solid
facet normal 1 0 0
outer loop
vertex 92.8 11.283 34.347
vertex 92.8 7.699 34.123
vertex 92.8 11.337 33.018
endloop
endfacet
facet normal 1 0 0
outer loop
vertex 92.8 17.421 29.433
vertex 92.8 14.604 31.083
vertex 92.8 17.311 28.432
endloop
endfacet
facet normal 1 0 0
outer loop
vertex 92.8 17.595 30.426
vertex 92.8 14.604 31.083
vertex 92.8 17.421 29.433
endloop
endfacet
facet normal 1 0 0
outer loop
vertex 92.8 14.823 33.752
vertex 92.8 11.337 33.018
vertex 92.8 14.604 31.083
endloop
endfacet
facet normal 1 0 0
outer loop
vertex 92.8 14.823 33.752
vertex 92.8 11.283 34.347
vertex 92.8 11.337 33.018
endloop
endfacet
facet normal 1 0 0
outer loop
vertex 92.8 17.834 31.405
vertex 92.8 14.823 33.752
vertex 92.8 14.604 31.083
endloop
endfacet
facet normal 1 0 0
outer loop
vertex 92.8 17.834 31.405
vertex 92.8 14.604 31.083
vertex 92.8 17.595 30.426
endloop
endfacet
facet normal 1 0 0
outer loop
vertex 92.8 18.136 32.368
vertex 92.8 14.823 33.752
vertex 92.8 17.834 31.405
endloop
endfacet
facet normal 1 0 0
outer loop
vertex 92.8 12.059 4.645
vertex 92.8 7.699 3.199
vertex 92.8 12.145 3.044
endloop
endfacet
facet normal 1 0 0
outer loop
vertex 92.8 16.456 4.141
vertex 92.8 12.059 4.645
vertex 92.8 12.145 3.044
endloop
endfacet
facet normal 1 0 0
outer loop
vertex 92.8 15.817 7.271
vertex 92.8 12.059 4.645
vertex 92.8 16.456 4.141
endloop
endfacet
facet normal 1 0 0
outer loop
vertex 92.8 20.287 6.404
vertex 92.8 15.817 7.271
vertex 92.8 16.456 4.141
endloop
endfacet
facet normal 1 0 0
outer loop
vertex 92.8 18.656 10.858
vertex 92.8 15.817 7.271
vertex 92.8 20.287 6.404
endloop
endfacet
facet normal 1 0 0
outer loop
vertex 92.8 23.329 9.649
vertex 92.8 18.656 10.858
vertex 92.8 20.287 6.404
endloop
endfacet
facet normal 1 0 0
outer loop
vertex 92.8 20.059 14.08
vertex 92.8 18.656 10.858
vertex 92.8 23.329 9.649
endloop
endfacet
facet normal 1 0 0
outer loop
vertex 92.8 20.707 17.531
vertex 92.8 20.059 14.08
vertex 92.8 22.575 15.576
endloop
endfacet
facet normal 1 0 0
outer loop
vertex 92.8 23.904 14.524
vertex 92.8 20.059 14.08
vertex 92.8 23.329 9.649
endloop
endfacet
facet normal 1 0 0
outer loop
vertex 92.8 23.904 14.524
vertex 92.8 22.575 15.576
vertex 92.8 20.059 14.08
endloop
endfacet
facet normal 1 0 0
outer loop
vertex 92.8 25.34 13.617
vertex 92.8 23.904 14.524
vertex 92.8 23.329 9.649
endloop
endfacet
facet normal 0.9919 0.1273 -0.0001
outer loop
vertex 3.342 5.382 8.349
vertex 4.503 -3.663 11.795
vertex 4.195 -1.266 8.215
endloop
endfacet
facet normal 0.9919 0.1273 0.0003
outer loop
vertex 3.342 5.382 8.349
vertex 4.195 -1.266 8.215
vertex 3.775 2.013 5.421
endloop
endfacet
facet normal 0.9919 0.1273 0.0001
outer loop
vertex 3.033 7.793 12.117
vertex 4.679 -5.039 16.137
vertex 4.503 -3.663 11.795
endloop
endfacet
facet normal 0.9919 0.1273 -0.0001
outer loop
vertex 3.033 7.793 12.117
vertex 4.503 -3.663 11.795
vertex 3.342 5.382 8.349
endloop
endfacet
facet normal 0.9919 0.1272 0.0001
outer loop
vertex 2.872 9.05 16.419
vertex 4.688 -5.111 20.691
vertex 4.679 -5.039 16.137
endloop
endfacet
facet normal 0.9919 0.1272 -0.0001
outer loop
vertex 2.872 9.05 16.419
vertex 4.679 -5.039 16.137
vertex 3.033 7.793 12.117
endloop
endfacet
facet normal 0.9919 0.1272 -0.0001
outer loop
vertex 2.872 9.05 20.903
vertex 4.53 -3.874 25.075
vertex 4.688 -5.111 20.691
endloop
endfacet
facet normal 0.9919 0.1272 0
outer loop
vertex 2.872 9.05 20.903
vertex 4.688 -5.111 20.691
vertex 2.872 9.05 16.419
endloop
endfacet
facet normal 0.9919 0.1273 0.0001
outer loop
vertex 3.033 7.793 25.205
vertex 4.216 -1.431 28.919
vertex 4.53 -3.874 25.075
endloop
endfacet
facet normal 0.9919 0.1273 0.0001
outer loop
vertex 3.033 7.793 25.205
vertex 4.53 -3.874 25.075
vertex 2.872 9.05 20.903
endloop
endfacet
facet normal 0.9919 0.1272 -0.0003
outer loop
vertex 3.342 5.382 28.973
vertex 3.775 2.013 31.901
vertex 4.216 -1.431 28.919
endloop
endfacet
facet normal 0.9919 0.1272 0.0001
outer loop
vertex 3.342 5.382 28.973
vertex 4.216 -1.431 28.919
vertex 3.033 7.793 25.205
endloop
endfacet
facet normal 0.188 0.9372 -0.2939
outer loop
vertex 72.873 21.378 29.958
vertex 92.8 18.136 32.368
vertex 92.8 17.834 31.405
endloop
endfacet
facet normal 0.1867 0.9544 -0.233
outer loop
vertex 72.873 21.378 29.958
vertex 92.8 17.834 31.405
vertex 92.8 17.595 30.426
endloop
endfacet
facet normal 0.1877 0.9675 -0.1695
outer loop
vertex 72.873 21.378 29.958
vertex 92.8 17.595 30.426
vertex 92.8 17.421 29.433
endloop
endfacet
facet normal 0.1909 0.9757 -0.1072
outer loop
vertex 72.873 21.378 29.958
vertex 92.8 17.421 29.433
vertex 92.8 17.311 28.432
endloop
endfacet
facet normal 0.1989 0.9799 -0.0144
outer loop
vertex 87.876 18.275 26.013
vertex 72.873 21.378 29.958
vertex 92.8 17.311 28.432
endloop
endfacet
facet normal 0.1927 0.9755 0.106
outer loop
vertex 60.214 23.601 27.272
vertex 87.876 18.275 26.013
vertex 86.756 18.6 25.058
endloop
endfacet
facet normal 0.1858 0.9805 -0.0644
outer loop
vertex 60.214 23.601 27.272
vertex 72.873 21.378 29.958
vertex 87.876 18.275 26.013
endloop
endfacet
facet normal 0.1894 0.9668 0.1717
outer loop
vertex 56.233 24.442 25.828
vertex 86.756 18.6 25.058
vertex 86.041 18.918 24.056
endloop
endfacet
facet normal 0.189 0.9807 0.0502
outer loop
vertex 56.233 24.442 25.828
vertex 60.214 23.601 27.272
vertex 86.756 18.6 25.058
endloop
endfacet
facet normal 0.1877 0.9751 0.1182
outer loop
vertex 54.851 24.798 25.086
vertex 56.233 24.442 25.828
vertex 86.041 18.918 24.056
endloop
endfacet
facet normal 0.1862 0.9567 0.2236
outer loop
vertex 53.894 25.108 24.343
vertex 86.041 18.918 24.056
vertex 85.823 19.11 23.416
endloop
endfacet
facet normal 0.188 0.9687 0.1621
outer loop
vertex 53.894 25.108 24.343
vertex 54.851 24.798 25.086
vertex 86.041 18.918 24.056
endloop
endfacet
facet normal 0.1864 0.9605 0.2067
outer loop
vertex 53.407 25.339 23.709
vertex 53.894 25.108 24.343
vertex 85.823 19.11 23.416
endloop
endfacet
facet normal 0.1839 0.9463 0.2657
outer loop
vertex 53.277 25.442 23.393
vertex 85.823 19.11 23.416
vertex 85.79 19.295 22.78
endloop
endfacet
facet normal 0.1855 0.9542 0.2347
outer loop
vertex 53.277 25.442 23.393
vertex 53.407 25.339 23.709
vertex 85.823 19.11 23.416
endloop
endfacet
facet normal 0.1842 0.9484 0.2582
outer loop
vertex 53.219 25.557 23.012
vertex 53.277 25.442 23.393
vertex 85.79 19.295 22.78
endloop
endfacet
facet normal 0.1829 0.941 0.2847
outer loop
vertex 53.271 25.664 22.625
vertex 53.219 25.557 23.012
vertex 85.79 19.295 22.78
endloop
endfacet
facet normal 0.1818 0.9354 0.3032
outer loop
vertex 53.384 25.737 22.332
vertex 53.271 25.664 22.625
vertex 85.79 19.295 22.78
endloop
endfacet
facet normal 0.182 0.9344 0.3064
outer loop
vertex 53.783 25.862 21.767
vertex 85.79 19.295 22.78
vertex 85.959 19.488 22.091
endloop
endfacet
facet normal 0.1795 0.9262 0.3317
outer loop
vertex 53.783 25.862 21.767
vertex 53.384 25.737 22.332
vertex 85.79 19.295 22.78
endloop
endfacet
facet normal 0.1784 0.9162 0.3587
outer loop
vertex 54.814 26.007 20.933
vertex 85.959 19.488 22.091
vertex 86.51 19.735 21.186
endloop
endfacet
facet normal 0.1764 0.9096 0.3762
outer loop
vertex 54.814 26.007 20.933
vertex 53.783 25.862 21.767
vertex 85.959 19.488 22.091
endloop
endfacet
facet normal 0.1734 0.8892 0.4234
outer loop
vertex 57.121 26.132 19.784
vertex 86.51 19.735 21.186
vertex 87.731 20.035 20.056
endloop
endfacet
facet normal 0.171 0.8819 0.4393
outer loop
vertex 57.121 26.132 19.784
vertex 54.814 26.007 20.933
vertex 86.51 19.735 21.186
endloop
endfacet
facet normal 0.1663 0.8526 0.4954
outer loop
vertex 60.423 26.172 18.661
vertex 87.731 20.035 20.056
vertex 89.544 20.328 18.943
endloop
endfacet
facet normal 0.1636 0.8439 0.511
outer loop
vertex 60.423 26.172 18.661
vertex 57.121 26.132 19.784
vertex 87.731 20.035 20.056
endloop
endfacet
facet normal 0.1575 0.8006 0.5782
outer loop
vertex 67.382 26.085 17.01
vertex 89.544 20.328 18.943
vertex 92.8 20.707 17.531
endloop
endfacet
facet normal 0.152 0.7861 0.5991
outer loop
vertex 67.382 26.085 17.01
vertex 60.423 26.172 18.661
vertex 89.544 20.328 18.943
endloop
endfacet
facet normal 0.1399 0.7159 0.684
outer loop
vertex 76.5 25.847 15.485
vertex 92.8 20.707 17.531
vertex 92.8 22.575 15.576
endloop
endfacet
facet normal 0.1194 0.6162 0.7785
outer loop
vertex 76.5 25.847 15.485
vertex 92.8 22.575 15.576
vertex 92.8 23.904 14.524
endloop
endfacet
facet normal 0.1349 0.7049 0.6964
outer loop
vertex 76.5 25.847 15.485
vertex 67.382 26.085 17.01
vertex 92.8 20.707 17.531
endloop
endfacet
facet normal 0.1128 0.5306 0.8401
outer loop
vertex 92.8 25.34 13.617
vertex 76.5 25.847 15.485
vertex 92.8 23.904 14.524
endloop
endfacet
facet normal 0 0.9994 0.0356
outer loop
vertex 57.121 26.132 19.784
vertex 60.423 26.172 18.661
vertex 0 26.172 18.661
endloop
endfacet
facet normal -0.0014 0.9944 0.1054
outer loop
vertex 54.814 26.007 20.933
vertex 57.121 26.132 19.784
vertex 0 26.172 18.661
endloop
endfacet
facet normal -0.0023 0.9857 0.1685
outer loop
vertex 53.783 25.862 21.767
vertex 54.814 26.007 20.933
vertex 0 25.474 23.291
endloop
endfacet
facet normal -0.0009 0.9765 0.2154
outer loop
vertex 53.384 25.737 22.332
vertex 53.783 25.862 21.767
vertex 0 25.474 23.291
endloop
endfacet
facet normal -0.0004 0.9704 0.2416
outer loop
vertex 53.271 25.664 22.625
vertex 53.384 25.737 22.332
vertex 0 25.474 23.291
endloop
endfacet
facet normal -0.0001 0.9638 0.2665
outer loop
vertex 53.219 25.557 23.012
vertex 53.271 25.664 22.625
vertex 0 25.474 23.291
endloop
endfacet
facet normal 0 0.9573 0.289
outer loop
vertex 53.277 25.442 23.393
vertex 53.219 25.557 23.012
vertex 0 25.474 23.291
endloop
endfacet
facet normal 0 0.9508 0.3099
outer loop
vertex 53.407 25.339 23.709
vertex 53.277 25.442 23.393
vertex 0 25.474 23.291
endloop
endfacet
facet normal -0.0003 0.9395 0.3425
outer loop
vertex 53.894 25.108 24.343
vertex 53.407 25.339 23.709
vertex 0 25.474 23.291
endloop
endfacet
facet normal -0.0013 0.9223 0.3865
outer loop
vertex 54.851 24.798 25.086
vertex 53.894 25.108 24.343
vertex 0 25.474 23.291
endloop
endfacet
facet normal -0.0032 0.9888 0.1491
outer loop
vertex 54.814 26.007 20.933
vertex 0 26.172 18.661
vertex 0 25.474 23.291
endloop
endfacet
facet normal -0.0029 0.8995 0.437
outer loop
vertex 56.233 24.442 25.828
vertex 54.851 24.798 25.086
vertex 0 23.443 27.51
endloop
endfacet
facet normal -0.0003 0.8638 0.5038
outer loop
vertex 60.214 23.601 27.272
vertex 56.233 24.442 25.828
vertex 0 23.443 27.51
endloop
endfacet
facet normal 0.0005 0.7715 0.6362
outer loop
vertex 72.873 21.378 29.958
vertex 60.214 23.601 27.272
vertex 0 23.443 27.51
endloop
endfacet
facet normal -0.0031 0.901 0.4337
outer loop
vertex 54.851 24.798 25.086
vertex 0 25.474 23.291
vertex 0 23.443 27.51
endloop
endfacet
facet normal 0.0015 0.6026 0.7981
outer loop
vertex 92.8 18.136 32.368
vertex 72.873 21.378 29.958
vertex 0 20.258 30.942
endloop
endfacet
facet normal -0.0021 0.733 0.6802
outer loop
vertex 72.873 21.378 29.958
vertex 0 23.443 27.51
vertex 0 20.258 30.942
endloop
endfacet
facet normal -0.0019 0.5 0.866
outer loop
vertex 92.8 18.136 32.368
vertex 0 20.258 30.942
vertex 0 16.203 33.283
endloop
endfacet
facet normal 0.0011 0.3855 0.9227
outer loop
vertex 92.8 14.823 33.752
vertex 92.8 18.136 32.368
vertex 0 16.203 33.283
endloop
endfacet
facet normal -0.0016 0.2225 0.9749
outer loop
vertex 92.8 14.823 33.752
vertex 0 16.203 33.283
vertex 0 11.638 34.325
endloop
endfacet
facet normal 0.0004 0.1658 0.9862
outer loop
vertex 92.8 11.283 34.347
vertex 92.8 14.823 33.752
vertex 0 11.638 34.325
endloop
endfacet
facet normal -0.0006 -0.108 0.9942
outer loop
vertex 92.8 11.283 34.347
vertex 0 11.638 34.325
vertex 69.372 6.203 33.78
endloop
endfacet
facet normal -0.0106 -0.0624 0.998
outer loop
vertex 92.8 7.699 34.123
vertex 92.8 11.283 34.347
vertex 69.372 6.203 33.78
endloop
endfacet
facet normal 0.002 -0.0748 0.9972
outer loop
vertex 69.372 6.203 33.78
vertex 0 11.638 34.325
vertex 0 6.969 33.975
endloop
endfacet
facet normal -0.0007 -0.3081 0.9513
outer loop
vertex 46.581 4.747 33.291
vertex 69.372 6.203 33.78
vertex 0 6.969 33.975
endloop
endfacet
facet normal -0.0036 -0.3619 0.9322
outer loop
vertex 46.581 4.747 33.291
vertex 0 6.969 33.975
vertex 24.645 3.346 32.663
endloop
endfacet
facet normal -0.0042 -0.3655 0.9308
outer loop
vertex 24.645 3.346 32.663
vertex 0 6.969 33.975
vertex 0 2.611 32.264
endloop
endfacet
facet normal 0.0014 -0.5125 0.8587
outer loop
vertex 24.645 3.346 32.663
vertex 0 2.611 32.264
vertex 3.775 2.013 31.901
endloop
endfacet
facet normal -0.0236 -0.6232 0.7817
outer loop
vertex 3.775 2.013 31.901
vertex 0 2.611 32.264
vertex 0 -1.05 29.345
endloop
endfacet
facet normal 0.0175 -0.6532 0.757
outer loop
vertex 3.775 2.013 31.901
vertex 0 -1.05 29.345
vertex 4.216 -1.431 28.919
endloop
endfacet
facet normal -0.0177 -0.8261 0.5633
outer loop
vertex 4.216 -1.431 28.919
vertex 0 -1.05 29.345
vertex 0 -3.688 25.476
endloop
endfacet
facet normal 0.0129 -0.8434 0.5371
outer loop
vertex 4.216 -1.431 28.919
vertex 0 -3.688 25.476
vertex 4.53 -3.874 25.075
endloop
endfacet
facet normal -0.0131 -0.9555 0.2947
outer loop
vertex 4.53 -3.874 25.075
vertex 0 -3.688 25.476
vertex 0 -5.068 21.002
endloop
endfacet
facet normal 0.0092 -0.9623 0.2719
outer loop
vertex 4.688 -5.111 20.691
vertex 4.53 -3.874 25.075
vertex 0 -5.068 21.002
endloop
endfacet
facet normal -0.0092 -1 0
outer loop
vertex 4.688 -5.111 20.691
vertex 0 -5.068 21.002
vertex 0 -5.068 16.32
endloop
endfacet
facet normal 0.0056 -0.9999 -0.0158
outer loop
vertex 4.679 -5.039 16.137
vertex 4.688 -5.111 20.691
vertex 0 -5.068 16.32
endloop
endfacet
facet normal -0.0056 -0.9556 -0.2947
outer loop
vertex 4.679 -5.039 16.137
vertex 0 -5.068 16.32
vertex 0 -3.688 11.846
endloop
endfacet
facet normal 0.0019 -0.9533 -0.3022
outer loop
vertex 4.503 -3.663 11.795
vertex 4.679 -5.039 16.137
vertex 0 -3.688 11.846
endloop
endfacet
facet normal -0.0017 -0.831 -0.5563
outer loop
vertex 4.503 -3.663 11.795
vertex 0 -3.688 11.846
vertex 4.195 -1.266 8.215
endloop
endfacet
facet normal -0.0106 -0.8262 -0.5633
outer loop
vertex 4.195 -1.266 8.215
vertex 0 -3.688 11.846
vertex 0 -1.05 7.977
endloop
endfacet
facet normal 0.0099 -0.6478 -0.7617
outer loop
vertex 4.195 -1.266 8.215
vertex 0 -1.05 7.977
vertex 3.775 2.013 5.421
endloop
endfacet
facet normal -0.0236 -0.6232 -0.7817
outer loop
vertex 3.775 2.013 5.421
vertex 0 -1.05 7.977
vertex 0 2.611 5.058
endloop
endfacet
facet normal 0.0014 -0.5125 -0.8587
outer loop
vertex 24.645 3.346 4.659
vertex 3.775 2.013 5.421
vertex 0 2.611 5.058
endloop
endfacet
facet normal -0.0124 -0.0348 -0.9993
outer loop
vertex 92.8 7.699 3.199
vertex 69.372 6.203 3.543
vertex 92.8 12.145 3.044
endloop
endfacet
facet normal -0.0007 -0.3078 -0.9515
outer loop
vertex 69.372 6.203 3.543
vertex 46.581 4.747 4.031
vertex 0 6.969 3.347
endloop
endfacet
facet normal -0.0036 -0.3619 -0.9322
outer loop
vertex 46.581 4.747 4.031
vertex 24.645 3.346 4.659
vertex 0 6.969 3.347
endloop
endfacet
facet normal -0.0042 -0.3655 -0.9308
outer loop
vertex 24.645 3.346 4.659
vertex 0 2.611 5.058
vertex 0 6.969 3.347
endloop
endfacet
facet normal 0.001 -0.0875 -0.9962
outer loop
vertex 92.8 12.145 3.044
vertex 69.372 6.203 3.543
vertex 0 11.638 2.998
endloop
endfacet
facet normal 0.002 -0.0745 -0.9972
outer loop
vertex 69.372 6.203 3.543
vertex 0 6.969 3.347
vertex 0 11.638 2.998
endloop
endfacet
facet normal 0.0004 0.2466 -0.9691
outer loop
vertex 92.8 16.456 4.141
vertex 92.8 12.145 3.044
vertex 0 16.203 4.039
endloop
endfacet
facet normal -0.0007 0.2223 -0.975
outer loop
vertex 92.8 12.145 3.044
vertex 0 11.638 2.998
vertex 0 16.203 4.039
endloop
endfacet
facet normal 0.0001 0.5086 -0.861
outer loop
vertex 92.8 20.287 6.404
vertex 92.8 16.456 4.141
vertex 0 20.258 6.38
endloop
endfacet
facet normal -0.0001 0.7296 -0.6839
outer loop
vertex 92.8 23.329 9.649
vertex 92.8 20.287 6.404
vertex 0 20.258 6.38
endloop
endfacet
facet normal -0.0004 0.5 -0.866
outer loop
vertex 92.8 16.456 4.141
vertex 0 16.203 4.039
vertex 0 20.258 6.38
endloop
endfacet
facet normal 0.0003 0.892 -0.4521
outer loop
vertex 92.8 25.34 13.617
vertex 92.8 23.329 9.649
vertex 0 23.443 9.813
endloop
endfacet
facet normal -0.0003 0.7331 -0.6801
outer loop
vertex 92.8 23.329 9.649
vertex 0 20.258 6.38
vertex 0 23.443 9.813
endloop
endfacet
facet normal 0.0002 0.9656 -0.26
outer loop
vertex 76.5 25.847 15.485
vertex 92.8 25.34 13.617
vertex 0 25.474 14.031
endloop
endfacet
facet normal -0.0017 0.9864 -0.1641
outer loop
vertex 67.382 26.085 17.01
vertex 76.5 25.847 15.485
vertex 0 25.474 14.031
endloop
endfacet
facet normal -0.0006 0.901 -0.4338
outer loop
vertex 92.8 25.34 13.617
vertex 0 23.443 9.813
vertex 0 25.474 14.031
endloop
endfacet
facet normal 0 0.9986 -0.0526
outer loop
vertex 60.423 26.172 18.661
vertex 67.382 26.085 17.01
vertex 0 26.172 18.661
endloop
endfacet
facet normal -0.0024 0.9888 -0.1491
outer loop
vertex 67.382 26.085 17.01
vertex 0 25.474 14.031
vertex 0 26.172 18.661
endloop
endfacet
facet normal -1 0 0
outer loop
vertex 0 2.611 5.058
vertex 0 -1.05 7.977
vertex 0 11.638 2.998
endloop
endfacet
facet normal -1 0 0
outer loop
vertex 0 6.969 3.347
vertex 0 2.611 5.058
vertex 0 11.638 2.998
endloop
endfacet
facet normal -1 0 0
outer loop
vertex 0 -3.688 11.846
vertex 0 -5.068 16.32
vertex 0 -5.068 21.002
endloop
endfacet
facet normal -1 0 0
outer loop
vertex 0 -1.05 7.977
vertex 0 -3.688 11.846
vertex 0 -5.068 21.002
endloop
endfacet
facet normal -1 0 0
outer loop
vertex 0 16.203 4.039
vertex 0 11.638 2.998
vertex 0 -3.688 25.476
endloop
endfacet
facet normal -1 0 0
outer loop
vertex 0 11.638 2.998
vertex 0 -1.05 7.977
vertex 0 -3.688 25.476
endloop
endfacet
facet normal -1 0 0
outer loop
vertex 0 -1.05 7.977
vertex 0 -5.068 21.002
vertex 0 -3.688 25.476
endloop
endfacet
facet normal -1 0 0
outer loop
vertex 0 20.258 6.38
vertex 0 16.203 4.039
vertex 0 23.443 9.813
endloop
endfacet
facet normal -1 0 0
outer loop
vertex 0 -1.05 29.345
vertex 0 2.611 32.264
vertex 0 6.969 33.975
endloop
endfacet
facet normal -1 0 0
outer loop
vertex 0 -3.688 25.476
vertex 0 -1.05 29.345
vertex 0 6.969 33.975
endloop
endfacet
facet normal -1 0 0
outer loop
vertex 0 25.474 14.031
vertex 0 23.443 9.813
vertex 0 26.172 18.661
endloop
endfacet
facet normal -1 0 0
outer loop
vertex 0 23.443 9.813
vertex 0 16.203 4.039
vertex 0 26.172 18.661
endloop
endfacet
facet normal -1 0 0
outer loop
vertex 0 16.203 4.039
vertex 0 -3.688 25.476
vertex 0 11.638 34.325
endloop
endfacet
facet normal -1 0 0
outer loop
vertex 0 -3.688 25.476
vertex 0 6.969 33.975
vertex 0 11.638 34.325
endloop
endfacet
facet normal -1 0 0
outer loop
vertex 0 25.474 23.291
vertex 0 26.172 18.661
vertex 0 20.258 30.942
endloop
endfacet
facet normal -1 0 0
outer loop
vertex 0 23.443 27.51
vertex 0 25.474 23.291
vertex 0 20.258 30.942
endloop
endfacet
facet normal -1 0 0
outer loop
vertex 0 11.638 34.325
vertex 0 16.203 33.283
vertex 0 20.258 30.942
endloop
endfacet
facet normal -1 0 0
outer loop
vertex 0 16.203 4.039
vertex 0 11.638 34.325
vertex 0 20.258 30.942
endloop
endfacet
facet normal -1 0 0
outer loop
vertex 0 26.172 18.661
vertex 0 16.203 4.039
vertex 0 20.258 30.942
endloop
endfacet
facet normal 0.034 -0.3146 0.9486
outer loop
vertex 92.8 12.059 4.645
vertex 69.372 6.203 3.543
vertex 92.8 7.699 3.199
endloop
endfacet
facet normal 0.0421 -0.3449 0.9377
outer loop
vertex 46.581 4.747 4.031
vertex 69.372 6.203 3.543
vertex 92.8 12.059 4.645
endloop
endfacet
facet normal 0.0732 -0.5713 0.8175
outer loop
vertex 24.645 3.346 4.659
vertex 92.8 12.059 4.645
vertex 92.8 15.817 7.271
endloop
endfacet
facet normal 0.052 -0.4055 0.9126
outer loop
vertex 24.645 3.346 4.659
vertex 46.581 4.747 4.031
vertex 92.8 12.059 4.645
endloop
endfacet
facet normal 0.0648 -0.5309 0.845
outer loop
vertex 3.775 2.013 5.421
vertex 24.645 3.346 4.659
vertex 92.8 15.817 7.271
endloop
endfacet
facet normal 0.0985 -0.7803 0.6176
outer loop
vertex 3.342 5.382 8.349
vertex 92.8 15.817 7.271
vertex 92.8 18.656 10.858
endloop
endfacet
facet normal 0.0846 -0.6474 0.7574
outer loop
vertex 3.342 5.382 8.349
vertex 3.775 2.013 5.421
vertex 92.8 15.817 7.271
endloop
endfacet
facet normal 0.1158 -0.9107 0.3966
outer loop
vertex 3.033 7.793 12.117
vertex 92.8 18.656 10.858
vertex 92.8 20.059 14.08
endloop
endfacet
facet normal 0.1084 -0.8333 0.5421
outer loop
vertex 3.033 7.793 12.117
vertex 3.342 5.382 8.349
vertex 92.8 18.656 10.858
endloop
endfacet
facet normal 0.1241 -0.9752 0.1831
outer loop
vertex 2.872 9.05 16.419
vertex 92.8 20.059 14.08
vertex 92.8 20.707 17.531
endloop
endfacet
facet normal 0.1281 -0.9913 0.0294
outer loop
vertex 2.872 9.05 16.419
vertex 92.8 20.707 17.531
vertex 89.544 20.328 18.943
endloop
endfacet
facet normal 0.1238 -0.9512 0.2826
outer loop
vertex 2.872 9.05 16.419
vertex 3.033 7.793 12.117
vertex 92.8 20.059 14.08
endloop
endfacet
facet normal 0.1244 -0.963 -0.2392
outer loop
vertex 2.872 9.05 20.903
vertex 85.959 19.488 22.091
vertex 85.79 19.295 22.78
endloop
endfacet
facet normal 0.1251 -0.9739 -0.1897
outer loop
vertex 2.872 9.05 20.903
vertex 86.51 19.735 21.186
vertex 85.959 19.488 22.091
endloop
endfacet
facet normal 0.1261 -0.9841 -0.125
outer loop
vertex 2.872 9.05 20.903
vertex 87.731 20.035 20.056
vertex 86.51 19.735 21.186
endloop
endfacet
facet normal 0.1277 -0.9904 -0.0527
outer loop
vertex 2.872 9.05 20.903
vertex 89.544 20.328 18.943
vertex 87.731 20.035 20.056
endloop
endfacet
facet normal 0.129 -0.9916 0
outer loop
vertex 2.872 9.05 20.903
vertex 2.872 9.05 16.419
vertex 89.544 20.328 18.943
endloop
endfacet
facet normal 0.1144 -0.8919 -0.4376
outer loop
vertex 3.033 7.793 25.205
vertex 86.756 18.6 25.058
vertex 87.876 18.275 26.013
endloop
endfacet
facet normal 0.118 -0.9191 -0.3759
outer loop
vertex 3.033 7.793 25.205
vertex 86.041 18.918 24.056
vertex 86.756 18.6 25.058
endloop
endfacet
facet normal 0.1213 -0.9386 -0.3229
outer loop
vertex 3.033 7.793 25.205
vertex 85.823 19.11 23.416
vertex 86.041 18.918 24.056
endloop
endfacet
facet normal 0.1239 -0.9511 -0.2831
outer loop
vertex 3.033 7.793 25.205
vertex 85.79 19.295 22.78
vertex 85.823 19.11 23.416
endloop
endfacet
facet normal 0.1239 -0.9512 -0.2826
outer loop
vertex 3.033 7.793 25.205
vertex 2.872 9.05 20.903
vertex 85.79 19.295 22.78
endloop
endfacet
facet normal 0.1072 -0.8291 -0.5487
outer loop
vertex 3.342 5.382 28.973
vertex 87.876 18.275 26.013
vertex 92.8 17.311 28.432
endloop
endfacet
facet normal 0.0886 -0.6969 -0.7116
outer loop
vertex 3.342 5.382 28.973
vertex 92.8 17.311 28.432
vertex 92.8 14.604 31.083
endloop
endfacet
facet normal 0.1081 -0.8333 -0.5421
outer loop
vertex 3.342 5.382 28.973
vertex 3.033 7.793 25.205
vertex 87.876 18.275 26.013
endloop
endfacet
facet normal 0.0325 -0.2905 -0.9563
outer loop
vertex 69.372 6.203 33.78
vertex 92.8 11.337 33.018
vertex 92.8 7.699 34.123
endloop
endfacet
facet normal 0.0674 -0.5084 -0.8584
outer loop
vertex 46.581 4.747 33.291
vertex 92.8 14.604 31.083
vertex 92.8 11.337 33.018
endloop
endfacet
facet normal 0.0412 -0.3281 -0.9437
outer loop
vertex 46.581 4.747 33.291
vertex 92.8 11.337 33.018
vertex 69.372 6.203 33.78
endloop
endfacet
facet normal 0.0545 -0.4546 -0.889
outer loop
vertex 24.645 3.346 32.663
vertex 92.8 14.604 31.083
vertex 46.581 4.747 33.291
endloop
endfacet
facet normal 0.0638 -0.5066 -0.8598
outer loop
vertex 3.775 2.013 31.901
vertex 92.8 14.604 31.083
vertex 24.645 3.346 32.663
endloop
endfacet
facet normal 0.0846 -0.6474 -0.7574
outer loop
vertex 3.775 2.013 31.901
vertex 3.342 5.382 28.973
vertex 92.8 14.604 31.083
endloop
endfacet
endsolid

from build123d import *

# Parameters (mm, degrees)
F0_R      = 15.707536
F1_DEPTH  = 92.8
F6_ANGLE  = -7.309847
F10_ANGLE = 11


with BuildPart() as f1:
    # F0 (on Right) → F1 (new body)
    with BuildSketch(Plane.YZ):
        with Locations((-37.135664, 18.661138)):
            Circle(F0_R)
    extrude(amount=F1_DEPTH)


with BuildPart() as f2_1:
    # F2: copy of F1
    add(f1.part.moved(Location((0, 47.6, 0))))


with BuildPart() as f3_1:
    # F3: copy of F2_1
    add(f2_1.part.moved(Location((0, 49.9, 0))))


with BuildPart() as f1_1:
    # F4: moved
    add(f1.part.moved(Location((4, 30.2, 0))))


with BuildPart() as f1_2:
    # F6: moved
    add(f1_1.part.rotate(Axis((0, 0, 16.515106), (0, 0, -1)), F6_ANGLE))


with BuildPart() as f3_1_1:
    # F7: moved
    add(f3_1.part.moved(Location((2.4, 0, 0))))


with BuildPart() as f3_1_2:
    # F8: moved
    add(f3_1_1.part.moved(Location((0, -10, 0))))


with BuildPart() as f3_1_3:
    # F9: moved
    add(f3_1_2.part.moved(Location((-0.2, 0, 8.6))))


with BuildPart() as f3_1_4:
    # F10: moved
    add(f3_1_3.part.rotate(Axis((0, 0, 16.515106), (0, 0, -1)), F10_ANGLE))


with BuildPart() as f2_1_1:
    add(f2_1.part)

    # F11: cut F1, F3_1
    add(f1_2.part, mode=Mode.SUBTRACT)
    add(f3_1_4.part, mode=Mode.SUBTRACT)


solid = f2_1_1.part
